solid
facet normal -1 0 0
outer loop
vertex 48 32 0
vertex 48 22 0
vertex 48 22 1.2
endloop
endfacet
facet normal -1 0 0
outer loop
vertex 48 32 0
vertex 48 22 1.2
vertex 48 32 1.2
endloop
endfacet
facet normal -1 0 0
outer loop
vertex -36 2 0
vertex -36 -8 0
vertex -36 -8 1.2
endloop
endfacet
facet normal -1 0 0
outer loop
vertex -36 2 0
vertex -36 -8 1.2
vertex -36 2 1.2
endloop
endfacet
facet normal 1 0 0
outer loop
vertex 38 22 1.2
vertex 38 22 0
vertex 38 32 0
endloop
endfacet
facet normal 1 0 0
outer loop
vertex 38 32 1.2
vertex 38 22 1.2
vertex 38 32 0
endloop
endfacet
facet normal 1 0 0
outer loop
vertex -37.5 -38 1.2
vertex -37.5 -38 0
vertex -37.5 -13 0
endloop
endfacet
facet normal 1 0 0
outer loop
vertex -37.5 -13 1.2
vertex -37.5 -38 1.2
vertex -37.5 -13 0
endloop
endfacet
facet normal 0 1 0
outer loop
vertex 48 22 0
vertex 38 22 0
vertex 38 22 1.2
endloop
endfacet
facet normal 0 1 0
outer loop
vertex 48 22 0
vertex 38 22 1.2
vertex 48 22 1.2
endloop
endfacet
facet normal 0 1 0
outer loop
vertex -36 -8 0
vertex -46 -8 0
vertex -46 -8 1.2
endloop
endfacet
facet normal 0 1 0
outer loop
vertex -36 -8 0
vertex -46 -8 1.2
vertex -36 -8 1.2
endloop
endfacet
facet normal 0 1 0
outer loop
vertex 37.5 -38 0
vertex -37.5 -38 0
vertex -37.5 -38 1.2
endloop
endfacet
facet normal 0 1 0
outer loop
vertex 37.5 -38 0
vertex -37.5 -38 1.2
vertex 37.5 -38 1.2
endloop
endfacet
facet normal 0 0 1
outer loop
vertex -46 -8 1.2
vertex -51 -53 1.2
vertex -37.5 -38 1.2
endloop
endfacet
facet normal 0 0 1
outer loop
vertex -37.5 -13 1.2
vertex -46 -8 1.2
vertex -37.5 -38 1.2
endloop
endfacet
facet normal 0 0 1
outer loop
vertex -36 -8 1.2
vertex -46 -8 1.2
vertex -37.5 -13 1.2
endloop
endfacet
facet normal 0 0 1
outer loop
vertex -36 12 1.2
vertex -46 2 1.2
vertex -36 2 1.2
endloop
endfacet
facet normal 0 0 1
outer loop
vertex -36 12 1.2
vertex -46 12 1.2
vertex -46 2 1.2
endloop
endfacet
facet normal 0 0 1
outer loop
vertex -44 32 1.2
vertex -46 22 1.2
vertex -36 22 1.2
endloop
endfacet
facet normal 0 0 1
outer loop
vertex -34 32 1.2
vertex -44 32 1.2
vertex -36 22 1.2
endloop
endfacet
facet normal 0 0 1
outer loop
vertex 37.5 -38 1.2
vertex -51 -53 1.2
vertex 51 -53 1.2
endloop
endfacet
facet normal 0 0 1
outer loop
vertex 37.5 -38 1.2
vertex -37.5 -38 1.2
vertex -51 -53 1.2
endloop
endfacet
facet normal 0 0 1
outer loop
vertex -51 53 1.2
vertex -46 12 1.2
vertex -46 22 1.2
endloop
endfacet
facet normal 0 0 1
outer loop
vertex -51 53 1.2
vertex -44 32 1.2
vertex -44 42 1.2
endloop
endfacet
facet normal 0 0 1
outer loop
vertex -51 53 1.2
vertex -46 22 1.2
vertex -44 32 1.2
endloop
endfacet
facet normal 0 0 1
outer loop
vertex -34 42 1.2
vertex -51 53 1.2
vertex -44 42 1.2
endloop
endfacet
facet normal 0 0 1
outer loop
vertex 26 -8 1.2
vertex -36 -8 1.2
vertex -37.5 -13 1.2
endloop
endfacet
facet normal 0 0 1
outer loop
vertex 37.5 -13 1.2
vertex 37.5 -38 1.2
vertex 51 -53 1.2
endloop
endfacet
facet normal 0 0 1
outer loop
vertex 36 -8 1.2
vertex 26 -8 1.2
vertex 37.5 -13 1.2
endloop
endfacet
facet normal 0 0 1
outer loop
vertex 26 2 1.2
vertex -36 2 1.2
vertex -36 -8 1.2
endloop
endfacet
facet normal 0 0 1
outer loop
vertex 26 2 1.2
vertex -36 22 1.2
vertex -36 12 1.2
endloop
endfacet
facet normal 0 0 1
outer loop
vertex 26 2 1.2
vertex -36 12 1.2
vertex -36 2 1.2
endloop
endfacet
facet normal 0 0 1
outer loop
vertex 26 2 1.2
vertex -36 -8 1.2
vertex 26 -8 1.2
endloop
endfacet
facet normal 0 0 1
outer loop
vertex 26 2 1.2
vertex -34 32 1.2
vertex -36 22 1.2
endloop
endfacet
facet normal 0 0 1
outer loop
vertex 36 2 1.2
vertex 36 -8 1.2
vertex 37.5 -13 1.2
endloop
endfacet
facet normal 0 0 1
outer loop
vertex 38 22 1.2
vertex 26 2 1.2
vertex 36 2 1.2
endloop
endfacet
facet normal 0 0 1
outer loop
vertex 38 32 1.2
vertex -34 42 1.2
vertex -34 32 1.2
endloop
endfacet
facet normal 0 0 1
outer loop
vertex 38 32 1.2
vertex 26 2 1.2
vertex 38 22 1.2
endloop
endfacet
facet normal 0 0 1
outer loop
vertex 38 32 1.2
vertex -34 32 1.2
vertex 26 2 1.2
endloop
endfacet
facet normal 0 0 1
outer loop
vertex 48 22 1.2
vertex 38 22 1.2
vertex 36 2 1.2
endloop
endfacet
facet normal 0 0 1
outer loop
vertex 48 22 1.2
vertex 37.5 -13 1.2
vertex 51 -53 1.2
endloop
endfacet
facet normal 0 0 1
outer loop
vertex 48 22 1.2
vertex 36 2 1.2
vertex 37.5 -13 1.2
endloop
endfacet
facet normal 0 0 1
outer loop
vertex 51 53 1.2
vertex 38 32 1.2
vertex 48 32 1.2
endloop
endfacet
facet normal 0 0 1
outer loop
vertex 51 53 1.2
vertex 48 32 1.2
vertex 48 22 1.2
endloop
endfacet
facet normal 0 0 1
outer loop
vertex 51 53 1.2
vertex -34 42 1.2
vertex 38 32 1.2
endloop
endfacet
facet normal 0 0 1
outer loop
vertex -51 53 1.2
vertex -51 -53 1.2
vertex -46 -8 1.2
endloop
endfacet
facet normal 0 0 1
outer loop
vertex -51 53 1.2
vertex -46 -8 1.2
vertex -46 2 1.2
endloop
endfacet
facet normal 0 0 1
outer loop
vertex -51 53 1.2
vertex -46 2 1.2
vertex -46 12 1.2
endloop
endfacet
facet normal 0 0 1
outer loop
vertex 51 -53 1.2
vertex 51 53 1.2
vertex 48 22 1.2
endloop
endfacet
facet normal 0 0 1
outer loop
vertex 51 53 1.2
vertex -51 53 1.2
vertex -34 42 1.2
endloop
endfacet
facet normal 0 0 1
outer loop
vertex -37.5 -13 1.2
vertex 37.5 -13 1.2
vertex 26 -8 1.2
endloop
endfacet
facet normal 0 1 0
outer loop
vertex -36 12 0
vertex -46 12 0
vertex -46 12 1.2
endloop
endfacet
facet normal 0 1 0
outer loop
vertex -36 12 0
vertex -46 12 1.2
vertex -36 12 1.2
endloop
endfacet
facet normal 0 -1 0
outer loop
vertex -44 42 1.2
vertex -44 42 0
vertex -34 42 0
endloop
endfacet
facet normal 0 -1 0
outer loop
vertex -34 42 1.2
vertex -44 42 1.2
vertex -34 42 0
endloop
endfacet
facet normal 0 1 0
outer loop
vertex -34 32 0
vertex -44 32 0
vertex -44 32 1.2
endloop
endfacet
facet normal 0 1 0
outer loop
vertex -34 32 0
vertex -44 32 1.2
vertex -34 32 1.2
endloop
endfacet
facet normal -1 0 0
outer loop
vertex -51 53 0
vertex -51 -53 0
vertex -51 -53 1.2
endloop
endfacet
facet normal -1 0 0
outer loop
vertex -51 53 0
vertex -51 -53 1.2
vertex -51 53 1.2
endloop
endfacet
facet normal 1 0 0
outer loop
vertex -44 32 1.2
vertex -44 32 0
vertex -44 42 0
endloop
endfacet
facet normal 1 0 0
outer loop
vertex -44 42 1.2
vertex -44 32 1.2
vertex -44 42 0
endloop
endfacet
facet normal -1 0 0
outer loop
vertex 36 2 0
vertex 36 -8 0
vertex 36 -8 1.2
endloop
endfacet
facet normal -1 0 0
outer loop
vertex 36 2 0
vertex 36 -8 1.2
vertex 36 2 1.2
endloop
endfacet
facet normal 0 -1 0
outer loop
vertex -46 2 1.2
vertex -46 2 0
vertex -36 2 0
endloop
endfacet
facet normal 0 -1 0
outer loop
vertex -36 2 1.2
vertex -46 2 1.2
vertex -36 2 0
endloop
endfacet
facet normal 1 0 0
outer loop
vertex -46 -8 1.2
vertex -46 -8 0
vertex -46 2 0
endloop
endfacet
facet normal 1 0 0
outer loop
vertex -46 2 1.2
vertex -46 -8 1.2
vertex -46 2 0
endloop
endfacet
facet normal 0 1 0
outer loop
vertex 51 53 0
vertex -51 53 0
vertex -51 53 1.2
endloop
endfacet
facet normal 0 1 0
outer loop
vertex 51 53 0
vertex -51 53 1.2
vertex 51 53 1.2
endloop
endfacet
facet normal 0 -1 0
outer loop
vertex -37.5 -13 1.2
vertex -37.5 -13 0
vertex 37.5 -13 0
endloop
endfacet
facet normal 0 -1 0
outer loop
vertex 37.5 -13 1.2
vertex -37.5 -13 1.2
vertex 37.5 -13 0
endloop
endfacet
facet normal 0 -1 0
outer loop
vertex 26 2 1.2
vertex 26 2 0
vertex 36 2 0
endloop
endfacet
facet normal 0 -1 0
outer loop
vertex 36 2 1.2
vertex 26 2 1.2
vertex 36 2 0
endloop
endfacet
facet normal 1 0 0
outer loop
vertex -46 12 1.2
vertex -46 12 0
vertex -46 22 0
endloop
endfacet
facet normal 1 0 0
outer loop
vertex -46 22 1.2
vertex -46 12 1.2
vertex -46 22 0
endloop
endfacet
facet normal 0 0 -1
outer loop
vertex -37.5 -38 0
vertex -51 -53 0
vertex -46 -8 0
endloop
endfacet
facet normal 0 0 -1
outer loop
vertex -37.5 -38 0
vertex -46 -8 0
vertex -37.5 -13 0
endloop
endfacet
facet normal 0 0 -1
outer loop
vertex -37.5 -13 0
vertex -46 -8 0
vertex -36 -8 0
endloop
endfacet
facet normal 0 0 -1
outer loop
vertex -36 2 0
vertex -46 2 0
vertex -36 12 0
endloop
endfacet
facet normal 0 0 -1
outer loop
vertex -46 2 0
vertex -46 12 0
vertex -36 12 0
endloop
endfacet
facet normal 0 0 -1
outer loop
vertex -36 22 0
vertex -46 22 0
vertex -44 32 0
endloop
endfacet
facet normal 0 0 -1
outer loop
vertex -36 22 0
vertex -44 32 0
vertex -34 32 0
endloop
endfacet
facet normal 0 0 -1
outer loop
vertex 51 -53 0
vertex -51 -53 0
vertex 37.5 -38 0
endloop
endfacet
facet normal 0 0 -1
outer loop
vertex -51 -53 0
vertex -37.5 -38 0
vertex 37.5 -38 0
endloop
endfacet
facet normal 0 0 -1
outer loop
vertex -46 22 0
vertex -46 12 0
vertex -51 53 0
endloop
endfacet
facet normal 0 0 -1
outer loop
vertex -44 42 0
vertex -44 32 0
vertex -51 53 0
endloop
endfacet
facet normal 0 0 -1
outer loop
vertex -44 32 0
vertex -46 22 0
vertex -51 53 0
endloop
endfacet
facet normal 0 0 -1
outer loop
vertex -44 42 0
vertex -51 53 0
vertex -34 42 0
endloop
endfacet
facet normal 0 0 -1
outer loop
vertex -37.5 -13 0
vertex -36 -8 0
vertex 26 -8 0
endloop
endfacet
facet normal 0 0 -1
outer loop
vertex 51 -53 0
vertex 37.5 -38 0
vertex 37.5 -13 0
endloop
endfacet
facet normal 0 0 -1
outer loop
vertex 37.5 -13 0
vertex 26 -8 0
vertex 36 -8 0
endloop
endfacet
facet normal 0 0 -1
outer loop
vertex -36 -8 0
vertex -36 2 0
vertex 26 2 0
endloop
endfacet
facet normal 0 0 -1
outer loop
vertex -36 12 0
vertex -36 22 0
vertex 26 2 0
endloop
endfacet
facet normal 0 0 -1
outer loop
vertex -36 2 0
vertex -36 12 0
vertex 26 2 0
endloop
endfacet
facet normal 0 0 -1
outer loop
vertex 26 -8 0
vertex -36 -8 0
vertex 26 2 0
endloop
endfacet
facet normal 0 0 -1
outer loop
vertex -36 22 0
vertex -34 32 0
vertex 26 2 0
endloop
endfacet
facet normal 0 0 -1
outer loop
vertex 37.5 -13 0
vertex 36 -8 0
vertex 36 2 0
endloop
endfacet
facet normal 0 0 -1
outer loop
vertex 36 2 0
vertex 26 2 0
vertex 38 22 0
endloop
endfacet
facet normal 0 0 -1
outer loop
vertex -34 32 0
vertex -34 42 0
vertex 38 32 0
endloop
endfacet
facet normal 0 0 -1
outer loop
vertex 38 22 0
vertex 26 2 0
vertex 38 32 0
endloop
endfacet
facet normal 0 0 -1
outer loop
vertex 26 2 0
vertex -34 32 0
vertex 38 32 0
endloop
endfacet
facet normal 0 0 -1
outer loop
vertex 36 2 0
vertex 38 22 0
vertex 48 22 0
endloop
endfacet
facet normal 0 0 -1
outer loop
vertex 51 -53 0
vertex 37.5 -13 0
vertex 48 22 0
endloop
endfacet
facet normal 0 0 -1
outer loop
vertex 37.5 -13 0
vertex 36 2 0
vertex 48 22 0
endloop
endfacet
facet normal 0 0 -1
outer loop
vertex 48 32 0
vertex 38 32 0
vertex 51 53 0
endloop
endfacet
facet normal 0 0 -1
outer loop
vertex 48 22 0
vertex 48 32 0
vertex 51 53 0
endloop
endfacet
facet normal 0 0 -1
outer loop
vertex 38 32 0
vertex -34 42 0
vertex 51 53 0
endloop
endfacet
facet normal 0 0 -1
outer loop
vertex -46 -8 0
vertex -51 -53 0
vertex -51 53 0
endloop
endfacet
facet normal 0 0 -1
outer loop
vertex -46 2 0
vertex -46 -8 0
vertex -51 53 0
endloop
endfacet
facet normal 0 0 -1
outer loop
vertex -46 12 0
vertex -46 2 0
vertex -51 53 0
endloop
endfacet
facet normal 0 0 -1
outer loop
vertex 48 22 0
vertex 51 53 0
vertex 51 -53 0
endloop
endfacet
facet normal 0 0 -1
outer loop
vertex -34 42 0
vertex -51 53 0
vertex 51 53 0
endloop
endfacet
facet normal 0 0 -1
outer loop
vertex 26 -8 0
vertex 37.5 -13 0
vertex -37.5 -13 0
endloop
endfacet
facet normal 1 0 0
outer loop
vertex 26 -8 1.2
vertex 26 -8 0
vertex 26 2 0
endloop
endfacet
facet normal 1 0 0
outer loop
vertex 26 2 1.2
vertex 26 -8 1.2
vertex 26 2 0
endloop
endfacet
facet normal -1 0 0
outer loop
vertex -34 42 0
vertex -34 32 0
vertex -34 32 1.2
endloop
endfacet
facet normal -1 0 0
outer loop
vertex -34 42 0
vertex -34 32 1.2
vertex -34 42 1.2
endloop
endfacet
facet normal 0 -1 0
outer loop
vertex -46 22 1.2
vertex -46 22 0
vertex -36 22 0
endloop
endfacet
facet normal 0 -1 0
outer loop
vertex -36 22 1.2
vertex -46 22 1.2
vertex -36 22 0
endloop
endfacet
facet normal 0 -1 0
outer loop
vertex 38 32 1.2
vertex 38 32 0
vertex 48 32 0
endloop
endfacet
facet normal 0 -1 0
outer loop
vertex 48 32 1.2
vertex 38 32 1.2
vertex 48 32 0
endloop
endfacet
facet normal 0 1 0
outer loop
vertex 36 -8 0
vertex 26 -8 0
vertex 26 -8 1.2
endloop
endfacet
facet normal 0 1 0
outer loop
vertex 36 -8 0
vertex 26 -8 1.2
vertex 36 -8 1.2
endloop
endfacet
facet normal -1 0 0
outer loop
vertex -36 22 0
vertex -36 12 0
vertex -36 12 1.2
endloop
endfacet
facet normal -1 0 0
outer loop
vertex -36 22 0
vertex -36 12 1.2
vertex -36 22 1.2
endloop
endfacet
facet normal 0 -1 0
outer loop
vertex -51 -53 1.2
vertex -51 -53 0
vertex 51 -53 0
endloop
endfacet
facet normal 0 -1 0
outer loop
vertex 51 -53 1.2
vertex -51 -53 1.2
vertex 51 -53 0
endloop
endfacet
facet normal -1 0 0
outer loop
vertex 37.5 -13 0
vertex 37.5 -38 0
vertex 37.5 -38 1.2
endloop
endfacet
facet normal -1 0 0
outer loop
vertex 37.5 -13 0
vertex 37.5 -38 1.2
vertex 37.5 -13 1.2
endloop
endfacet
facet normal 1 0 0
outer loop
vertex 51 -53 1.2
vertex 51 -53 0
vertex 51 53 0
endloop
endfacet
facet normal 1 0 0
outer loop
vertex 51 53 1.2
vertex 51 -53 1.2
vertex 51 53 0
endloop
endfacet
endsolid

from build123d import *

# Parameters (mm, degrees)
SKETCH_1_W               = 102
SKETCH_1_H               = 106
EXTRUDE_1_DEPTH          = 1.2
CUT_EXTRUDE_2_DEPTH      = 10
CUT_EXTRUDE_2_DEPTH_BACK = 10
SKETCH_2_W               = 75
SKETCH_2_H               = 25
CUT_EXTRUDE_3_DEPTH      = 10
CUT_EXTRUDE_3_DEPTH_BACK = 10
SKETCH_3_W               = 10
SKETCH_3_H               = 10
CUT_EXTRUDE_4_DEPTH      = 10
CUT_EXTRUDE_4_DEPTH_BACK = 10
SKETCH_4_W               = 10
SKETCH_4_H               = 10


with BuildPart() as part:
    # 草图1 → 凸台-拉伸1 (new body)
    with BuildSketch(Plane.XY):
        Rectangle(SKETCH_1_W, SKETCH_1_H)
    extrude(amount=EXTRUDE_1_DEPTH)

    # 草图2 → 切除-拉伸2 (cut, two sides: drawn at the far end of the back side and taken through both)
    with BuildSketch(Plane.XY.offset(1.2).offset(-CUT_EXTRUDE_2_DEPTH_BACK)):
        with Locations((0, -25.5)):
            Rectangle(SKETCH_2_W, SKETCH_2_H)
    extrude(amount=CUT_EXTRUDE_2_DEPTH + CUT_EXTRUDE_2_DEPTH_BACK, mode=Mode.SUBTRACT)

    # 草图3 → 切除-拉伸3 (cut, two sides: drawn at the far end of the back side and taken through both)
    with BuildSketch(Plane.XY.offset(1.2).offset(-CUT_EXTRUDE_3_DEPTH_BACK)):
        with Locations((-41, -3)):
            Rectangle(SKETCH_3_W, SKETCH_3_H)
        with Locations((31, -3)):
            Rectangle(SKETCH_3_W, SKETCH_3_H)
    extrude(amount=CUT_EXTRUDE_3_DEPTH + CUT_EXTRUDE_3_DEPTH_BACK, mode=Mode.SUBTRACT)

    # 草图4 → 切除-拉伸4 (cut, two sides: drawn at the far end of the back side and taken through both)
    with BuildSketch(Plane.XY.offset(1.2).offset(-CUT_EXTRUDE_4_DEPTH_BACK)):
        with Locations((-41, 17)):
            Rectangle(SKETCH_4_W, SKETCH_4_H)
        with Locations((-39, 37)):
            Rectangle(SKETCH_4_W, SKETCH_4_H)
        with Locations((43, 27)):
            Rectangle(SKETCH_4_W, SKETCH_4_H)
    extrude(amount=CUT_EXTRUDE_4_DEPTH + CUT_EXTRUDE_4_DEPTH_BACK, mode=Mode.SUBTRACT)


solid = part.part
